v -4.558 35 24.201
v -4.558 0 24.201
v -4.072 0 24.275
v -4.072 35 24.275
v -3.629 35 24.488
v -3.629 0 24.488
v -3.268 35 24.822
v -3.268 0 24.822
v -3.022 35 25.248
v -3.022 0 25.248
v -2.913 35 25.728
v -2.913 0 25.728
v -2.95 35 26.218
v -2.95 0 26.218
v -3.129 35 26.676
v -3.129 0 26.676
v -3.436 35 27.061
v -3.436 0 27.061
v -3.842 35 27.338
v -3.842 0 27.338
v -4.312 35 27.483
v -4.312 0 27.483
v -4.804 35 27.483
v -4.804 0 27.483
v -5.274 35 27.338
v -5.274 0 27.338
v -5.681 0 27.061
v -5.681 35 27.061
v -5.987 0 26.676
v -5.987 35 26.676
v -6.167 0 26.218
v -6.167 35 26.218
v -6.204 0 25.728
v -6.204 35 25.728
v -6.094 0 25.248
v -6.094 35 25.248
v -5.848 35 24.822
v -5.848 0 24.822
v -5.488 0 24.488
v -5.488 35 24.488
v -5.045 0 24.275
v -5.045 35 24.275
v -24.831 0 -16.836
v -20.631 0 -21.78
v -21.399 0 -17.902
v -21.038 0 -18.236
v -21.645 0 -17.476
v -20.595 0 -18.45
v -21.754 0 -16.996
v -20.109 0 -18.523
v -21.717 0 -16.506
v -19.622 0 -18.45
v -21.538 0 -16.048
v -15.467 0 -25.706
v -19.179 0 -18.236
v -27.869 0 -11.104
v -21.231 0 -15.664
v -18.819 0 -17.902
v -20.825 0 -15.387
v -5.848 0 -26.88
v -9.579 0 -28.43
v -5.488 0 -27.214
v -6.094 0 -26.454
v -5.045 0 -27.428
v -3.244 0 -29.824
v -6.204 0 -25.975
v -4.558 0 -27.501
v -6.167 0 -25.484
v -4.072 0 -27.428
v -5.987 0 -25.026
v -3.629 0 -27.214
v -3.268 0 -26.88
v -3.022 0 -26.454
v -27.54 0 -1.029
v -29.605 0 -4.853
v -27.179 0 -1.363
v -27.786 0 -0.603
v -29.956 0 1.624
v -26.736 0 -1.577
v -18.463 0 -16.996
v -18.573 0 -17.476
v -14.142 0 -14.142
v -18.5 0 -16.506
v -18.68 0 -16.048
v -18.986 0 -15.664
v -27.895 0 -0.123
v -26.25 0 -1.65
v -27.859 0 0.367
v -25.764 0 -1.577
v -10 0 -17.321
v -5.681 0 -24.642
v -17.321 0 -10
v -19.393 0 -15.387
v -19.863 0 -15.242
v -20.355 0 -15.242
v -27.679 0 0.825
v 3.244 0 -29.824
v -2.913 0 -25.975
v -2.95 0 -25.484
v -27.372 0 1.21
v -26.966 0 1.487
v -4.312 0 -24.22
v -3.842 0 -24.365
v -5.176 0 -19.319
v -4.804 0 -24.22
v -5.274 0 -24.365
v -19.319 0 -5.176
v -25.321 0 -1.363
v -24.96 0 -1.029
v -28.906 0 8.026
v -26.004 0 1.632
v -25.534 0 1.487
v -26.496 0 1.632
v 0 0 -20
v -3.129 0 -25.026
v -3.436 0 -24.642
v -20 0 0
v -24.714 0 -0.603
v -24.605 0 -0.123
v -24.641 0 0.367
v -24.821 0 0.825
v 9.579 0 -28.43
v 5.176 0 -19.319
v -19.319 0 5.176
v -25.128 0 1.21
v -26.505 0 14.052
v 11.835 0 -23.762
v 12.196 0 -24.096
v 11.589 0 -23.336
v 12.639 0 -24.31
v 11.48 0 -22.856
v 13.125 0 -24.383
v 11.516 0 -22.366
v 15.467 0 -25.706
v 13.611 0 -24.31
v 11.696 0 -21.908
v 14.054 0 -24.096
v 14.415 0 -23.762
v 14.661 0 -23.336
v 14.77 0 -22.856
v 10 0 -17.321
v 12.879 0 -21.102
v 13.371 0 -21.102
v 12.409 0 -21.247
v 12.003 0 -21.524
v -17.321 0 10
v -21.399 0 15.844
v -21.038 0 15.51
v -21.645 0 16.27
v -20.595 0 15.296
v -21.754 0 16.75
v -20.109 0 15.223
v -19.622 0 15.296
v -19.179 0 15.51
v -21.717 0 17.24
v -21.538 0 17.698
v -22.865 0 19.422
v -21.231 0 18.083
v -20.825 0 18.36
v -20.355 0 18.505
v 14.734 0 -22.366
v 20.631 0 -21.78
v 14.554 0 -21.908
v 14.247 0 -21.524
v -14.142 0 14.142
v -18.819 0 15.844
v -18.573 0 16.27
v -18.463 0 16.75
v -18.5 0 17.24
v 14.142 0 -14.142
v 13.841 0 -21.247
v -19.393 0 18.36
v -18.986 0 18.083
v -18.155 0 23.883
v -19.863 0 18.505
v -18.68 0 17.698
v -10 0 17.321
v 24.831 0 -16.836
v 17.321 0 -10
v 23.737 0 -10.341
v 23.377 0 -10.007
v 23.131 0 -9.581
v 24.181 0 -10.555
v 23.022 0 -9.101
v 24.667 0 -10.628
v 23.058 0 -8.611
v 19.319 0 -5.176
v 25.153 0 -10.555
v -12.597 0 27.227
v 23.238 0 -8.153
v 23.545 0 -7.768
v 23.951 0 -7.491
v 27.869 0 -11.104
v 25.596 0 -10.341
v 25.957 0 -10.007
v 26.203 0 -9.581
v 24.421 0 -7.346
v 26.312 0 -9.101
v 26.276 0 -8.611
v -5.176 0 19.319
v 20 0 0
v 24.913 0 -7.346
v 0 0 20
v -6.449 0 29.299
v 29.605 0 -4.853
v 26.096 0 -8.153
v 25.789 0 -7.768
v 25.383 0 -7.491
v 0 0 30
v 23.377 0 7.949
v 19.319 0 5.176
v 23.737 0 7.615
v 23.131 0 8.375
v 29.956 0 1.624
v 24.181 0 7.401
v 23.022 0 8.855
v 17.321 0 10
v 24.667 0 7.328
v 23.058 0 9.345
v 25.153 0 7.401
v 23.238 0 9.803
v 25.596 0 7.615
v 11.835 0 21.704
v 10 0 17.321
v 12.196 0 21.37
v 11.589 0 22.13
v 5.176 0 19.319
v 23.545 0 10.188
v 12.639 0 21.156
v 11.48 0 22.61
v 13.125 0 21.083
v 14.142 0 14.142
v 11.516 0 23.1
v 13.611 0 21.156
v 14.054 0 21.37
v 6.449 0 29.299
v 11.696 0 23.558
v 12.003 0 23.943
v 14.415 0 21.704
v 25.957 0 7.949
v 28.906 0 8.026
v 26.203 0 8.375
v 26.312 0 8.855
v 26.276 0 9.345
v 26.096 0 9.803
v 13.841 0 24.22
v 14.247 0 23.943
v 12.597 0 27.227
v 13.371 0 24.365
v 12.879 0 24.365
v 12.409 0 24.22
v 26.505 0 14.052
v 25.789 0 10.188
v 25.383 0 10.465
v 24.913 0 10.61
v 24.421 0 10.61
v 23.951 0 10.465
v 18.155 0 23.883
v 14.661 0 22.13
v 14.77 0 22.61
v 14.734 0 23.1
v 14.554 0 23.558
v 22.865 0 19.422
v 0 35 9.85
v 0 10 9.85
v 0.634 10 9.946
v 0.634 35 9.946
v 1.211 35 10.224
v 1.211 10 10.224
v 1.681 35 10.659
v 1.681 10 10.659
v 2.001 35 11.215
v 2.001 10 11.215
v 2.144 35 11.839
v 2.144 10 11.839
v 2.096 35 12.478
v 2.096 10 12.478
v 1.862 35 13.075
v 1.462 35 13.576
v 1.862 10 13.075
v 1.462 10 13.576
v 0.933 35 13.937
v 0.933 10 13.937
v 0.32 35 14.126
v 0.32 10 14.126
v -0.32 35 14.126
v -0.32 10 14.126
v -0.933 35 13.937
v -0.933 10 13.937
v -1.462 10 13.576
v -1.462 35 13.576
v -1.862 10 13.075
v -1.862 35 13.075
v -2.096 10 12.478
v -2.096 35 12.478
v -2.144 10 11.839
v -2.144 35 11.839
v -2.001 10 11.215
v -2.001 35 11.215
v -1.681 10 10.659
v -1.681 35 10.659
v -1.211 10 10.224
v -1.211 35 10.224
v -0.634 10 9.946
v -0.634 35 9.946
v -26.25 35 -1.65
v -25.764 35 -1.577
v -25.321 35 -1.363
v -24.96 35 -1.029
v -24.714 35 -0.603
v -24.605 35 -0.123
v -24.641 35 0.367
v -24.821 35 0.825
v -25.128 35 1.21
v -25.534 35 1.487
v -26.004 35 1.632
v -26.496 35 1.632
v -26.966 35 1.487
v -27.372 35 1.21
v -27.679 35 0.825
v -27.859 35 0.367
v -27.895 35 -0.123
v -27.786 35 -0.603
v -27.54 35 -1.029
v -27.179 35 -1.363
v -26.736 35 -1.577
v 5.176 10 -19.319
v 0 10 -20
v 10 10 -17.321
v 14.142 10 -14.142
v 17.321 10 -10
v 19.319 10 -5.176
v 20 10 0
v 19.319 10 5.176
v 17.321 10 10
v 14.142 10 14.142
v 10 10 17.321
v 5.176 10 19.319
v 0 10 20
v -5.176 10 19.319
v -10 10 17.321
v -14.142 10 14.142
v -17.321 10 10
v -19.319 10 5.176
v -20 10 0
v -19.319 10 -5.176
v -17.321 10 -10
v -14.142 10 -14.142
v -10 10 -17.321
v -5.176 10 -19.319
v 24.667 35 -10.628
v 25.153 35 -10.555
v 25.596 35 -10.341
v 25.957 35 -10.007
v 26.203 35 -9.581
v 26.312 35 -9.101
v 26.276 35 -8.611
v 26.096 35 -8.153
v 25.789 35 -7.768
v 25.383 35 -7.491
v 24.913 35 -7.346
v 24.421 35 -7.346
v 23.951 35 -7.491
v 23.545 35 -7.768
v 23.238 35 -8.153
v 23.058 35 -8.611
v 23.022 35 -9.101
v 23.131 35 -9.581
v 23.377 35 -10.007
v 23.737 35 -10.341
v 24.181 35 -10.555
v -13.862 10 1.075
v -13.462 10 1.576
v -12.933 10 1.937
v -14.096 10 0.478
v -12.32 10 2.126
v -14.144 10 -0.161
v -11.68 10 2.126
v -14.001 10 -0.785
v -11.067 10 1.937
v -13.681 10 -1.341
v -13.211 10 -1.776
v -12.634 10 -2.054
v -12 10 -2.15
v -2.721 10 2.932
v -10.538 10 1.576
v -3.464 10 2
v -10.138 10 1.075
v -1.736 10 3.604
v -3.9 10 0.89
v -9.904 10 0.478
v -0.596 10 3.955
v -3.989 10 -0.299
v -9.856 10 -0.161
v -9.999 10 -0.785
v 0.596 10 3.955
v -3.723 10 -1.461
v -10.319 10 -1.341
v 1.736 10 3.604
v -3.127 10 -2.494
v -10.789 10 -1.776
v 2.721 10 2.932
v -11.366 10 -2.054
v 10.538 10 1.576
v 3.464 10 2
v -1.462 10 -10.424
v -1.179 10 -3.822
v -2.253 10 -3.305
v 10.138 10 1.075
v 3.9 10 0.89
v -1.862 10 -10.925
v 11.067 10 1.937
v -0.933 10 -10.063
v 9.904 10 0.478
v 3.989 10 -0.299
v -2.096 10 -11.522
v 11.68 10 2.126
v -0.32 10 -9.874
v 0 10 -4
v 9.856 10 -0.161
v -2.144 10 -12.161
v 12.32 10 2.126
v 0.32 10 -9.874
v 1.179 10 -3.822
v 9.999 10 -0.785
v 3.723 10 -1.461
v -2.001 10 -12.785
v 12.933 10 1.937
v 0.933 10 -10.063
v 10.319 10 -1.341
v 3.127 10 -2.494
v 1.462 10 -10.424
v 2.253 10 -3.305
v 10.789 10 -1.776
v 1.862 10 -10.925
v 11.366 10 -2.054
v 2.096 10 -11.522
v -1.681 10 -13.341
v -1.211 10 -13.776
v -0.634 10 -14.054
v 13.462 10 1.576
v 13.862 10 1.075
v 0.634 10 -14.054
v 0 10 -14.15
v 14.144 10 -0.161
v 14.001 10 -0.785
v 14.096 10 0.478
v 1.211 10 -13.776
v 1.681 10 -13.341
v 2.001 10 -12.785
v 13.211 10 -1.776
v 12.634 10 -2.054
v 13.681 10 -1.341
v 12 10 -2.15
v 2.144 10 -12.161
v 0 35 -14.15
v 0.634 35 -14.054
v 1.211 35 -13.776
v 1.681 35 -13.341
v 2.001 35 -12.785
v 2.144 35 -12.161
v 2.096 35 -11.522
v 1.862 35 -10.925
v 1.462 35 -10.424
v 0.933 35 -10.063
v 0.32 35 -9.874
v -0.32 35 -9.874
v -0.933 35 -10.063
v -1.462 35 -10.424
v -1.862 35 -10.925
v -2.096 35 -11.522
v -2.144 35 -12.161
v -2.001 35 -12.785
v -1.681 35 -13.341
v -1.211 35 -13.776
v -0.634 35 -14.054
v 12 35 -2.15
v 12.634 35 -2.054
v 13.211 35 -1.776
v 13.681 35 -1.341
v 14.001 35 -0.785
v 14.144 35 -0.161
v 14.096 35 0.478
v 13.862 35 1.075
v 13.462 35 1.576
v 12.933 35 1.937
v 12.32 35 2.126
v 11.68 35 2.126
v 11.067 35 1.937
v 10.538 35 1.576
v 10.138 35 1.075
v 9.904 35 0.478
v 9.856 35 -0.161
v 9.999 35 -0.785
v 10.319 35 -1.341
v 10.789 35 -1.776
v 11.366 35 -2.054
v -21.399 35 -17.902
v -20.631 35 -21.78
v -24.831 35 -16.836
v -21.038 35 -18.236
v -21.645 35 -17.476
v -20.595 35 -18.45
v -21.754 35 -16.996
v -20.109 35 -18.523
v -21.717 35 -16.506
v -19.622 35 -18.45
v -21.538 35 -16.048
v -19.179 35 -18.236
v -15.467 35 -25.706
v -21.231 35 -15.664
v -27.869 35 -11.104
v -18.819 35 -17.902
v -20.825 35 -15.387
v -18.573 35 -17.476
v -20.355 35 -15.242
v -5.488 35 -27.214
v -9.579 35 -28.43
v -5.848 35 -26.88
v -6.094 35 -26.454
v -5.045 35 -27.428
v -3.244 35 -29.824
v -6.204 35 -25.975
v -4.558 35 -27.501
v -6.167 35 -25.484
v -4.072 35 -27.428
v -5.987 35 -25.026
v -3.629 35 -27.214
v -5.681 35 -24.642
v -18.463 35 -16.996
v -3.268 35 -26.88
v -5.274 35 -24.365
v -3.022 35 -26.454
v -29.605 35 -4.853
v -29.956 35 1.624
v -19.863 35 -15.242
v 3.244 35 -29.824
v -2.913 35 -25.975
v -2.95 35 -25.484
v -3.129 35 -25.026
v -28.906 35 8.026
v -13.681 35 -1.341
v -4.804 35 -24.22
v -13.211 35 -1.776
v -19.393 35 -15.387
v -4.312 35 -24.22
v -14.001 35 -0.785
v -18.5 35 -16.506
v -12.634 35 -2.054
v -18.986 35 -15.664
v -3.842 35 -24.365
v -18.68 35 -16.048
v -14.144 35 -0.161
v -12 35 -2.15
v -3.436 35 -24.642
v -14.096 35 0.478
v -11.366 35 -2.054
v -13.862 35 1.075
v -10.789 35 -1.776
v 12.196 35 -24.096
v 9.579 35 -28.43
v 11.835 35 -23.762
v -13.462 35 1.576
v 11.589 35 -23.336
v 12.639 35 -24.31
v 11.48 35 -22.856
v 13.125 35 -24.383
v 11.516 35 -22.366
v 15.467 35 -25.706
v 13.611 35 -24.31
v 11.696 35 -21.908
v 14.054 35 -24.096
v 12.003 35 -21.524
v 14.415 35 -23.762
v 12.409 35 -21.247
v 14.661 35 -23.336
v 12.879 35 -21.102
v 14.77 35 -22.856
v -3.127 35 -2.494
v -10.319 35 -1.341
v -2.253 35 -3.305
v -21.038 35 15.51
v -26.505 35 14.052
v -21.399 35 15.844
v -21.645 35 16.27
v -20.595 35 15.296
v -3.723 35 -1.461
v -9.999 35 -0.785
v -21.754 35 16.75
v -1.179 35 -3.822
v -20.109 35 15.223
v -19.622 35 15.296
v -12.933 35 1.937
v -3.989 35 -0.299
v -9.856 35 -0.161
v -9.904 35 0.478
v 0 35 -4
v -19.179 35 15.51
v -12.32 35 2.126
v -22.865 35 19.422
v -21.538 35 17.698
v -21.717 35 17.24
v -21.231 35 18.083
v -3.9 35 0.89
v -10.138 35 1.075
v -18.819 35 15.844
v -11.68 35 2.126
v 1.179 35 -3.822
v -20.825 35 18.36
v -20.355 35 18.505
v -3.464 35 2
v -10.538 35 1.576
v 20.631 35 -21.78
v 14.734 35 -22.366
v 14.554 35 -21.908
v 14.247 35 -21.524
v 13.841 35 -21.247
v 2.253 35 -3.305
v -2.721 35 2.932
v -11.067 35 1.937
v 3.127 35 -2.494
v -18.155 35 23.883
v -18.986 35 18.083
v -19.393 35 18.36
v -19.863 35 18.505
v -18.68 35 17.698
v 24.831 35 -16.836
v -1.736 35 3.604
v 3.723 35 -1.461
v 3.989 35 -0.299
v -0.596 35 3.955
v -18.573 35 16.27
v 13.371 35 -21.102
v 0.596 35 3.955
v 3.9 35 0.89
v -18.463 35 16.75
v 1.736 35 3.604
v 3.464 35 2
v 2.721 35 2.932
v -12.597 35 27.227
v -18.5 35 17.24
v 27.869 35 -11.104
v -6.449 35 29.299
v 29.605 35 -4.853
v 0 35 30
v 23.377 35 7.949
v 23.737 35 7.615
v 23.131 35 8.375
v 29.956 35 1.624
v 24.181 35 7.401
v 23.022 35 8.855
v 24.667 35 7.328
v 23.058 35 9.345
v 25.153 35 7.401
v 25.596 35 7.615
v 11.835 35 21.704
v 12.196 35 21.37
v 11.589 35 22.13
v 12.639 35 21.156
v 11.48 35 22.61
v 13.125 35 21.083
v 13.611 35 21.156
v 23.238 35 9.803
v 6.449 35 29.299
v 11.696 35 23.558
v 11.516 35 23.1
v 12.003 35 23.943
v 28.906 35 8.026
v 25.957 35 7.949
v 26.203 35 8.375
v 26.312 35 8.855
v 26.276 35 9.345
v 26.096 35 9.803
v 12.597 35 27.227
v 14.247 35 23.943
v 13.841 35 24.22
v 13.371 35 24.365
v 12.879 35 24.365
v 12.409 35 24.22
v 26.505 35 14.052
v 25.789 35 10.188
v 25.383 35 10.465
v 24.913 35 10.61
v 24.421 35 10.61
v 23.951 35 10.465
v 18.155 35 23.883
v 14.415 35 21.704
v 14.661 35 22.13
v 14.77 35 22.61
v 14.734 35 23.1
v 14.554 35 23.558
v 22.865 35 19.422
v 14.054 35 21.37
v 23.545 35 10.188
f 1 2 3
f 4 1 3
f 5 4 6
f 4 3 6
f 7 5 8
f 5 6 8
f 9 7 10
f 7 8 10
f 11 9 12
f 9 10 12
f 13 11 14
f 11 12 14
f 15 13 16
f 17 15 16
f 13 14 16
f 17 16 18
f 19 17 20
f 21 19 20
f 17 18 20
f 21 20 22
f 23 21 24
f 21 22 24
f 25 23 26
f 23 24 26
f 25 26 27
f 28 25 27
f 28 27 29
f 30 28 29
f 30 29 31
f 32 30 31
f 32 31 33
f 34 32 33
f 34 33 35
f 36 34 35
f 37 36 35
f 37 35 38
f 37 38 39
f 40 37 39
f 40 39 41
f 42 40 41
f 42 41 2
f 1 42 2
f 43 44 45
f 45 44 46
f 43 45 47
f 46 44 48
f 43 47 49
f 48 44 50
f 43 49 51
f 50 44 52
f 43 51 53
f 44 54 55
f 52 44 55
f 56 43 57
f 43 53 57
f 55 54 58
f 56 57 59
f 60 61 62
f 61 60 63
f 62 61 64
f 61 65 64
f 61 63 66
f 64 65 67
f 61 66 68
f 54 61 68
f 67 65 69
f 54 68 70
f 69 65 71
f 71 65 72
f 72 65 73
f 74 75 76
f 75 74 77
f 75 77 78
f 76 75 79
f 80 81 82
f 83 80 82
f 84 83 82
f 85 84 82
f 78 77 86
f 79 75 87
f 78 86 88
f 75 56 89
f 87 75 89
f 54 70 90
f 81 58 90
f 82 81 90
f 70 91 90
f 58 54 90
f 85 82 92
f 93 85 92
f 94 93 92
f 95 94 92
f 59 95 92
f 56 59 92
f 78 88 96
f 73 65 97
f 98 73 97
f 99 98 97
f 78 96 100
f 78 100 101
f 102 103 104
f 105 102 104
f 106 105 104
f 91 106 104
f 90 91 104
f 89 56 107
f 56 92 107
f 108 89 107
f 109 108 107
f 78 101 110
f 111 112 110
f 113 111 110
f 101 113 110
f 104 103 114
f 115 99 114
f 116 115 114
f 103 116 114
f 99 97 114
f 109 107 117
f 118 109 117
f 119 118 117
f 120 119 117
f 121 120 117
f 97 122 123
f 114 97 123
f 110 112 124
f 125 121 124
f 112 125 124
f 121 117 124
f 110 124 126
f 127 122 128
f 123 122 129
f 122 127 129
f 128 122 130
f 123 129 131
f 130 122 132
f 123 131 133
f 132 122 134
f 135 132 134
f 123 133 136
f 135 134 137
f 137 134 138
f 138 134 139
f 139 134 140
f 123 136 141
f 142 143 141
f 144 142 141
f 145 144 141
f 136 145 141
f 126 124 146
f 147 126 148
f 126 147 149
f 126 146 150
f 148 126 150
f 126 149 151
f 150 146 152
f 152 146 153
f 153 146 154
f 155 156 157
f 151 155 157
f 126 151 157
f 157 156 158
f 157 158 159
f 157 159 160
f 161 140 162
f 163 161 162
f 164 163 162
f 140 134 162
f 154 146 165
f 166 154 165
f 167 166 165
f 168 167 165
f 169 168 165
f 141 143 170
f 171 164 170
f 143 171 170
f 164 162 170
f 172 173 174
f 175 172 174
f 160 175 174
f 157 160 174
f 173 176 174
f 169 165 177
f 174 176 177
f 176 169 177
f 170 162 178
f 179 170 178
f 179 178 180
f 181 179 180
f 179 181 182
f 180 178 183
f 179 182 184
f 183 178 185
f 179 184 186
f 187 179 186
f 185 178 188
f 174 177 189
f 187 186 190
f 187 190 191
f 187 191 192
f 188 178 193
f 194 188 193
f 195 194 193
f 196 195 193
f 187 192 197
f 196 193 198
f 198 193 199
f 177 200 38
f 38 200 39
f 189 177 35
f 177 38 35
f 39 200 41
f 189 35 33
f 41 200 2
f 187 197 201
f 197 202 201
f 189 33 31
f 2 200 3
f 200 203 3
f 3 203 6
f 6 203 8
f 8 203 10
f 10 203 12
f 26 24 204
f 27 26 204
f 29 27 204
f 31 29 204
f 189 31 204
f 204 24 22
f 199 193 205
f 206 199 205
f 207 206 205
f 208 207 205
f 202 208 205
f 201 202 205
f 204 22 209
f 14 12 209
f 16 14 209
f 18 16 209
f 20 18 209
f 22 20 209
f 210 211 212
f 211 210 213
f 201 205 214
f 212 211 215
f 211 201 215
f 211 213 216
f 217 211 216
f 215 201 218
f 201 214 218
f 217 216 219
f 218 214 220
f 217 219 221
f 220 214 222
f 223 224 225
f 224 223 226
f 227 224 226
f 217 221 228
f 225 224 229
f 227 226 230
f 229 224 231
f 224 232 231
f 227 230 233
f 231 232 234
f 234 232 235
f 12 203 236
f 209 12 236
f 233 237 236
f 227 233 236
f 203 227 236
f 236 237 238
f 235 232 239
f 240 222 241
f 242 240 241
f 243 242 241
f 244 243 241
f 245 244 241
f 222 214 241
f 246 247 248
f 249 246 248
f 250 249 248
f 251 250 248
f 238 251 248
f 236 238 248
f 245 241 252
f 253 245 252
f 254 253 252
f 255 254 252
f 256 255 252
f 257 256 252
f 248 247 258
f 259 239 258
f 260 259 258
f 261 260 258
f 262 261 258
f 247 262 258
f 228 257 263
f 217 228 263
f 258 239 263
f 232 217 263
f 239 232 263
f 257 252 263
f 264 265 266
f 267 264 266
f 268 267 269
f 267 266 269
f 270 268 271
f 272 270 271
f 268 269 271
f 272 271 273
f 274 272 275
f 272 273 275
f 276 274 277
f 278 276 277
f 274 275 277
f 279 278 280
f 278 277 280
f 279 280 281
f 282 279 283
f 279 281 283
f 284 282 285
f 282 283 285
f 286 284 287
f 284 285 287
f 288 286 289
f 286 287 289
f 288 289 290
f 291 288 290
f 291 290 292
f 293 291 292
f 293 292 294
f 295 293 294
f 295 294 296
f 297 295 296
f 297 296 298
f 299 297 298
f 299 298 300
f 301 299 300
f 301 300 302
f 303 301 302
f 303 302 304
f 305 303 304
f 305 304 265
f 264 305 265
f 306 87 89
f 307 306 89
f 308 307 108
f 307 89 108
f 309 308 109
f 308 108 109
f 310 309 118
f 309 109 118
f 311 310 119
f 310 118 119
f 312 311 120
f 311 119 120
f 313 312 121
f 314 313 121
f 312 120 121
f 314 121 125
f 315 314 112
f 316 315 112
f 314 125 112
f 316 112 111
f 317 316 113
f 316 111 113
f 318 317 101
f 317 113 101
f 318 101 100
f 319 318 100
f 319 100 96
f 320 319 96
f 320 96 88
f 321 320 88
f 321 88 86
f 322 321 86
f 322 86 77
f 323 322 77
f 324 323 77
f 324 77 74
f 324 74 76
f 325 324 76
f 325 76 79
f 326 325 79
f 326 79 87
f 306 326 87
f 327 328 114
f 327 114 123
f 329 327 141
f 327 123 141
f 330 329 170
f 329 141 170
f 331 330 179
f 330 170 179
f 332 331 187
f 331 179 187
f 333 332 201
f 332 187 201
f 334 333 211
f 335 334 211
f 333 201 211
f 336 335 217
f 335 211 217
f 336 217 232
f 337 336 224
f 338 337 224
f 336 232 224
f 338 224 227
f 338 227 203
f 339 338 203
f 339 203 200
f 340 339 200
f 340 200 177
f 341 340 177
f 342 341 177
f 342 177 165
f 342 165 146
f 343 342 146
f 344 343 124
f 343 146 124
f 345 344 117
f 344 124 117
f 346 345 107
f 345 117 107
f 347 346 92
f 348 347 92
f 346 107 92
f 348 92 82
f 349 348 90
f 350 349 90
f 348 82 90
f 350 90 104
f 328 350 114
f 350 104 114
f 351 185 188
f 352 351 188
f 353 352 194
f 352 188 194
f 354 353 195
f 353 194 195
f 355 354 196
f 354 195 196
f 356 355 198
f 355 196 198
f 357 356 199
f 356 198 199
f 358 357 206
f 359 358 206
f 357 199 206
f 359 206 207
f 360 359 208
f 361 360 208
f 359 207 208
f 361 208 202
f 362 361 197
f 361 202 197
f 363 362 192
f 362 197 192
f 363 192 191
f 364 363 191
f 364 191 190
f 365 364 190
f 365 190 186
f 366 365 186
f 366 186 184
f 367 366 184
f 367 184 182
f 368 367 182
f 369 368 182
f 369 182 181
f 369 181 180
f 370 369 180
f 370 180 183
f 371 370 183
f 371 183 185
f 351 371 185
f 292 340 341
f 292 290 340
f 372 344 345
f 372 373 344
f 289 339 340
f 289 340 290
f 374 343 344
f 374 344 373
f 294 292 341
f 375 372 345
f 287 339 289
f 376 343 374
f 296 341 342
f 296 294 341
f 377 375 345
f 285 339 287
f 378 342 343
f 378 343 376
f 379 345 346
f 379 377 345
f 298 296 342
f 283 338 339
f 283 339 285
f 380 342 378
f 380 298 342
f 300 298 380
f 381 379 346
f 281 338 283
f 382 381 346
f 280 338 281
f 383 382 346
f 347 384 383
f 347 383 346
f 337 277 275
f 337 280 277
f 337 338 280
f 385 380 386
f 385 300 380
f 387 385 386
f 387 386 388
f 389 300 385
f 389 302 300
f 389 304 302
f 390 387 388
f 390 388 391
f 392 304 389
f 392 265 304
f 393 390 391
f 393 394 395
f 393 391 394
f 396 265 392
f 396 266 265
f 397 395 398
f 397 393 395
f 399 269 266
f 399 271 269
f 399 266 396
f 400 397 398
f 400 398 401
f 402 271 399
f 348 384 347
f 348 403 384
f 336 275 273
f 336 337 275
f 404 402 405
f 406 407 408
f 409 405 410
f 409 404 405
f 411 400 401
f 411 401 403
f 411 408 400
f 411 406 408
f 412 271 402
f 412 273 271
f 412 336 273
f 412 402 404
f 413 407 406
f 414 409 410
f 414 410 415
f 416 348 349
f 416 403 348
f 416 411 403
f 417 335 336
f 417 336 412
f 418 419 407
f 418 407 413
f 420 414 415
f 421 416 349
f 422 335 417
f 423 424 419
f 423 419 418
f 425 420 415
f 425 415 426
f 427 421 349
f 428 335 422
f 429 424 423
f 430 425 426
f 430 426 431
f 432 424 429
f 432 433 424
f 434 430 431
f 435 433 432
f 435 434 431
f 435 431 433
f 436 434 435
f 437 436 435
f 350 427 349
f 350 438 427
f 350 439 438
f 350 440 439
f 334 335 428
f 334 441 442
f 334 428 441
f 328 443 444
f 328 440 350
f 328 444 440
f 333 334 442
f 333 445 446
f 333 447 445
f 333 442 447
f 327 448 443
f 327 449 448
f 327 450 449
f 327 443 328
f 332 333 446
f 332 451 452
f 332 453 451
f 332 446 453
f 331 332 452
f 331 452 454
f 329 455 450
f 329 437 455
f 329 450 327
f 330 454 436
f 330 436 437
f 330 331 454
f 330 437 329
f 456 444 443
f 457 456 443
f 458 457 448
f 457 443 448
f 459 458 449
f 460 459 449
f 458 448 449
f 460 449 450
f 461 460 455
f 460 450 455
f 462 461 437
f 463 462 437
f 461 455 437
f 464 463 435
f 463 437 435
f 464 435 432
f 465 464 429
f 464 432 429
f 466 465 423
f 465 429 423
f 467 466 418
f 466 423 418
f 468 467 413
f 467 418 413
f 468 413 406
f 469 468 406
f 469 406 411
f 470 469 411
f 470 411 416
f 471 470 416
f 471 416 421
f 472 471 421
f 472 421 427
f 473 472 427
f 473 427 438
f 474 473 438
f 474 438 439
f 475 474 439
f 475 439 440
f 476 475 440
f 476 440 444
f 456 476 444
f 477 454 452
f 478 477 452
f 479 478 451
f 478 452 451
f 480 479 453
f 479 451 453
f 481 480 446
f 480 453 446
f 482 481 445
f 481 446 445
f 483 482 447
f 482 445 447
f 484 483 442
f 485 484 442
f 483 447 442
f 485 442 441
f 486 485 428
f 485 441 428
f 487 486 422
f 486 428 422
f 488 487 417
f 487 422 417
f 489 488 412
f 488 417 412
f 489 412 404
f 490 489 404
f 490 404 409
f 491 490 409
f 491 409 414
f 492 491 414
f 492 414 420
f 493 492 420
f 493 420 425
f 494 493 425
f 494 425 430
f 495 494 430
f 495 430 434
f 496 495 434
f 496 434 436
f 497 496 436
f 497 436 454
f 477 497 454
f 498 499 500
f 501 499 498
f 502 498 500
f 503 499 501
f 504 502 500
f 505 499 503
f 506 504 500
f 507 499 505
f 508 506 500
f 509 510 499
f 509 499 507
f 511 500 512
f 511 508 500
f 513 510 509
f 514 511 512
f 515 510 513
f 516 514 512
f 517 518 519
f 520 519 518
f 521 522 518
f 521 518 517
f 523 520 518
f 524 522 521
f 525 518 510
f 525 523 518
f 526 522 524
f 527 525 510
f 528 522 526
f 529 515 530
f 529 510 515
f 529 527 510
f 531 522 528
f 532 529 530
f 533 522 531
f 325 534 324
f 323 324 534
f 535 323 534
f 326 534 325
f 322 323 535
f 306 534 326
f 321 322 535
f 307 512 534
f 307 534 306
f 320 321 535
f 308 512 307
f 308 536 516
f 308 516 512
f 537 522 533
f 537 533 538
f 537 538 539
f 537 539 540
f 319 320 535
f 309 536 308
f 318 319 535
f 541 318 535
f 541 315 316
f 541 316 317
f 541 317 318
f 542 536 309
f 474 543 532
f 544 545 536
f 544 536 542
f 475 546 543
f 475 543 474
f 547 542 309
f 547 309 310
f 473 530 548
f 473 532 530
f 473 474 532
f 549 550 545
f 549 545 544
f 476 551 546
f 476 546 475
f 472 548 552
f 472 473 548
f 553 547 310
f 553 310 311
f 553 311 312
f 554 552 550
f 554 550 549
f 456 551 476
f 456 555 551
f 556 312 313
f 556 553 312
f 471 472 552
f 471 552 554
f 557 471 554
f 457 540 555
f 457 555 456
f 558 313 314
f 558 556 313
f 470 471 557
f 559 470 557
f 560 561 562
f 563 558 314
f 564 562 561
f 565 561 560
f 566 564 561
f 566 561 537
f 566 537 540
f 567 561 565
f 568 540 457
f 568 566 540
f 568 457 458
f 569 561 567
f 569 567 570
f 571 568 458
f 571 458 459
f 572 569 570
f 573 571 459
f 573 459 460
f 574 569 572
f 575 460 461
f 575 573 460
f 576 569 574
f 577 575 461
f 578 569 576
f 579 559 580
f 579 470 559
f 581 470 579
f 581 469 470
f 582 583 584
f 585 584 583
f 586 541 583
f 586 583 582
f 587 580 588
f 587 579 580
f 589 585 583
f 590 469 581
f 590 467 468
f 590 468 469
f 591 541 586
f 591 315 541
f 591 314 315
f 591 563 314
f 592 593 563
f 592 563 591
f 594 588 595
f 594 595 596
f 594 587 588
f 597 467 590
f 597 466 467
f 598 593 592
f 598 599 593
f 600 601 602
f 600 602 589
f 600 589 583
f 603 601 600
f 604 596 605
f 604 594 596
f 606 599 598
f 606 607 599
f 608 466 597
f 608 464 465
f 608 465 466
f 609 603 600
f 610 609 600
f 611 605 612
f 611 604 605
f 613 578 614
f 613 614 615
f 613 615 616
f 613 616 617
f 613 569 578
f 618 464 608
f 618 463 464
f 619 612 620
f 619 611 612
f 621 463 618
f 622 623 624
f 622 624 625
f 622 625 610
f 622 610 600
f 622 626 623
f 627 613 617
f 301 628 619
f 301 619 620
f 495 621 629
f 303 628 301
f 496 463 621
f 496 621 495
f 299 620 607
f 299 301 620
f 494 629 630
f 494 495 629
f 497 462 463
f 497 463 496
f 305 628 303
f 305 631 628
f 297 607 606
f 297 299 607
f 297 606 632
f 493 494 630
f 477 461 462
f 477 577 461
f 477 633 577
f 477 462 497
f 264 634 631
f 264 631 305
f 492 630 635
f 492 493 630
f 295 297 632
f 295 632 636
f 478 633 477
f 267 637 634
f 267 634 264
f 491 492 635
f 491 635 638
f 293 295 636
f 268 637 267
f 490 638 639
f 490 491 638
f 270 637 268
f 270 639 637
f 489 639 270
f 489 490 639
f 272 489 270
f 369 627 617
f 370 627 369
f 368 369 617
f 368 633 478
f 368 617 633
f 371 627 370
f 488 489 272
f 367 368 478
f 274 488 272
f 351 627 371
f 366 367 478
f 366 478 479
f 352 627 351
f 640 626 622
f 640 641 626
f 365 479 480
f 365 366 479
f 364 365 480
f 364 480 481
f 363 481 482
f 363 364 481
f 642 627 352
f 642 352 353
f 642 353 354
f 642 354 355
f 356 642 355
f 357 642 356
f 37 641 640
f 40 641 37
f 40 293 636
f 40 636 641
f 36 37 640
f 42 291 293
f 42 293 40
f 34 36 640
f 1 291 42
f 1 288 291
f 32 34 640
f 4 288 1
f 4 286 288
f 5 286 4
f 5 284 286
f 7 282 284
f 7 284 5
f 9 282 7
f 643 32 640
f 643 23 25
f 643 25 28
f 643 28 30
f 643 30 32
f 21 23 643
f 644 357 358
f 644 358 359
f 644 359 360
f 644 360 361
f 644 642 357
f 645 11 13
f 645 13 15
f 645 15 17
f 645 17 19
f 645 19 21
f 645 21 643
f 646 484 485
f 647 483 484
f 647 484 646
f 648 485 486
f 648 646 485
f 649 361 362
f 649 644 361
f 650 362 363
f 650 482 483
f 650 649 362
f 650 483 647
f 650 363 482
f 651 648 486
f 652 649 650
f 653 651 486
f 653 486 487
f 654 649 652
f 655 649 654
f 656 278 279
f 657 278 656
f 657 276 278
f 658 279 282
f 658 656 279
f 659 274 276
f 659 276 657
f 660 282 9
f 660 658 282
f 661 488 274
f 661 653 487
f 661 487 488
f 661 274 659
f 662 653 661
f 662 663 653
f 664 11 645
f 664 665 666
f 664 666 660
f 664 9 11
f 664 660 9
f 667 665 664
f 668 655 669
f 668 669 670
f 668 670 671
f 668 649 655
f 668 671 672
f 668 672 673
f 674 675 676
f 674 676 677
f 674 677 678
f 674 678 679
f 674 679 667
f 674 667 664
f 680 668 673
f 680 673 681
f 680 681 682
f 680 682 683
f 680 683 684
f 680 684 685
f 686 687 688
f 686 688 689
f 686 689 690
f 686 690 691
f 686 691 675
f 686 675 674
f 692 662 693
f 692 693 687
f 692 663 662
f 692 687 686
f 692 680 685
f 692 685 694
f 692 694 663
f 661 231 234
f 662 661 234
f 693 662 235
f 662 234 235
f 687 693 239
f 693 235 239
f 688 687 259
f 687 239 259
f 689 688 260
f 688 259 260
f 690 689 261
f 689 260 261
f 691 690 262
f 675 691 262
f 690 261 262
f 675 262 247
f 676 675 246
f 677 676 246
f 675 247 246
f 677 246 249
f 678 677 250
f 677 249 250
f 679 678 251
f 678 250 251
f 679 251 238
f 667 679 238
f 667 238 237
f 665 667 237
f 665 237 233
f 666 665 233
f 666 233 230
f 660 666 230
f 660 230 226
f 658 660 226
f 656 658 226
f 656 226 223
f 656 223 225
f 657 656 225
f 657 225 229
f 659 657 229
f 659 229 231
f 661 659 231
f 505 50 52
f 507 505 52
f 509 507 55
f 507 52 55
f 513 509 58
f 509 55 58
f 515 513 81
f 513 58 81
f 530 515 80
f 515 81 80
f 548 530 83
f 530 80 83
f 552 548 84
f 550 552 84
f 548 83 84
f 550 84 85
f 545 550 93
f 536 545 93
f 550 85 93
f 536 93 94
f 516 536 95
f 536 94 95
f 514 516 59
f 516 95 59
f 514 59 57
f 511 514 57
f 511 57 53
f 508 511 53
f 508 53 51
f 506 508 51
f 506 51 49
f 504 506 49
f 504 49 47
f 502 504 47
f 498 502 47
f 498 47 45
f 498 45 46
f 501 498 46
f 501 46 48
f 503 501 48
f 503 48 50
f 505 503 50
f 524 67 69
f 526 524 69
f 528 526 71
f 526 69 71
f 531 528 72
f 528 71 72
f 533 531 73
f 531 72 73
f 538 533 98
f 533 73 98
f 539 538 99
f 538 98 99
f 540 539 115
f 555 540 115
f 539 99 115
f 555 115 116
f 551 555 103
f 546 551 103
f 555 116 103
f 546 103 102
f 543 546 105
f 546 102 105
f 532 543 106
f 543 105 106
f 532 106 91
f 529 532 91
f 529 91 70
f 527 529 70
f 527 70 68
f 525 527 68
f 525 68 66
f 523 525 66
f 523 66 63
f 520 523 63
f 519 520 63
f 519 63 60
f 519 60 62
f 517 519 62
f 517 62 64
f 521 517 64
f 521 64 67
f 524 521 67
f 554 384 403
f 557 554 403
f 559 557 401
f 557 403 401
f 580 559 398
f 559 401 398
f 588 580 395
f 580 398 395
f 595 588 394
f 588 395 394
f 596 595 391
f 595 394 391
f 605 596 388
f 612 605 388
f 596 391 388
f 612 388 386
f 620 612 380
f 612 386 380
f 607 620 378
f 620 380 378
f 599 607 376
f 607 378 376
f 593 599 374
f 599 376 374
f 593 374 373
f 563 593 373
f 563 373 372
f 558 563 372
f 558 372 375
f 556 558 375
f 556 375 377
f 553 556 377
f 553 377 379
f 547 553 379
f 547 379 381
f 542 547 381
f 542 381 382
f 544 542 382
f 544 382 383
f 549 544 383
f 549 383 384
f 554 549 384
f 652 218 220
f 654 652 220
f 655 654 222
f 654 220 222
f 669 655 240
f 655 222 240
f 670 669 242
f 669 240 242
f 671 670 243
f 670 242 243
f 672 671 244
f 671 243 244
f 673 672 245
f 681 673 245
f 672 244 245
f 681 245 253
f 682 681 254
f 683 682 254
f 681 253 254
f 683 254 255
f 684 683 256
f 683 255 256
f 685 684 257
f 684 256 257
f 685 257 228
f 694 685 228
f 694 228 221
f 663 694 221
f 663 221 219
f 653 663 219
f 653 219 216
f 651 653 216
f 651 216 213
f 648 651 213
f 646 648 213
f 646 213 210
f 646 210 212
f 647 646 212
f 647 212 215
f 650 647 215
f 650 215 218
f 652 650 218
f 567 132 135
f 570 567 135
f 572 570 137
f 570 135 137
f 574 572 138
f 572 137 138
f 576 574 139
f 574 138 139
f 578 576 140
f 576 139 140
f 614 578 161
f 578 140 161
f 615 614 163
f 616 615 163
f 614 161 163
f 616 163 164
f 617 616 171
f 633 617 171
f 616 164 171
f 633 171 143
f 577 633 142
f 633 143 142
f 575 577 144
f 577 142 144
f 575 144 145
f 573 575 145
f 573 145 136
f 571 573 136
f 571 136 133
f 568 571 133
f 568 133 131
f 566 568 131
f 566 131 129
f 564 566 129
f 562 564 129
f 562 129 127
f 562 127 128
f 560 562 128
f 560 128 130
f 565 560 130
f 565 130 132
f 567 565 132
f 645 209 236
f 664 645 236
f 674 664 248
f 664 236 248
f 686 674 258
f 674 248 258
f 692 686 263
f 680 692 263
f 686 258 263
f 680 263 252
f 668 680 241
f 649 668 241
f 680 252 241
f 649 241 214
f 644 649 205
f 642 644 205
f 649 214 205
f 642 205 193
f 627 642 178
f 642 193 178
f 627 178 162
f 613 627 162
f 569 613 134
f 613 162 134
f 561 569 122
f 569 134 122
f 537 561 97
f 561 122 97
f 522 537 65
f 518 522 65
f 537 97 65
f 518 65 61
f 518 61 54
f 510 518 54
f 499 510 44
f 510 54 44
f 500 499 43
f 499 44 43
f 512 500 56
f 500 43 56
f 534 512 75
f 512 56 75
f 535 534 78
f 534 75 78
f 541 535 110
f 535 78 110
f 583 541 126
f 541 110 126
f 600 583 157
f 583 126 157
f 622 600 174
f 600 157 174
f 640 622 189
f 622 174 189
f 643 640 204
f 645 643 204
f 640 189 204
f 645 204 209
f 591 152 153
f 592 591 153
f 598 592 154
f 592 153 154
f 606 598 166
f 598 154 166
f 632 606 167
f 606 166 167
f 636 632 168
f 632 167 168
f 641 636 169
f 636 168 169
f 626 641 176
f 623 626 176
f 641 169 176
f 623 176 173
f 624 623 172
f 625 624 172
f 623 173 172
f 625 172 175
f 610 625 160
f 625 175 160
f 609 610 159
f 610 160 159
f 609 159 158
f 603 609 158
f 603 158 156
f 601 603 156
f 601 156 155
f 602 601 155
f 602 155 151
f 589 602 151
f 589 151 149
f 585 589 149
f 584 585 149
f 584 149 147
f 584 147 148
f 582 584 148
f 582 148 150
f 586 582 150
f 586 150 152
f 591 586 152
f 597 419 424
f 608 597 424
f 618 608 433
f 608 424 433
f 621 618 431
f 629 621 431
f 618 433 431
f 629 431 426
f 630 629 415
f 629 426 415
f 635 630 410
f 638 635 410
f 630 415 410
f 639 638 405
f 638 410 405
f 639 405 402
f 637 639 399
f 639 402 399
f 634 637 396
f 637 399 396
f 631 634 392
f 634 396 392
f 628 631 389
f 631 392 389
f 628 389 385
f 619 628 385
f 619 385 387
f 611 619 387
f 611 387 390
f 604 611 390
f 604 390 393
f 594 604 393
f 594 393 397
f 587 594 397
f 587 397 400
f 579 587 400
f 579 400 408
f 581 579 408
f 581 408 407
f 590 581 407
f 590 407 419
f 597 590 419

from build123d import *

# Parameters (mm, degrees)
SKETCH_1_R          = 30
EXTRUDE_1_DEPTH     = 35
SKETCH_2_R          = 1.65
CUT_EXTRUDE_1_DEPTH = 56
SKETCH_4_R          = 20
CUT_EXTRUDE_3_DEPTH = 10
SKETCH_5_R          = 4
CUT_EXTRUDE_4_DEPTH = 50.244289009
SKETCH_6_R          = 2.15
CUT_EXTRUDE_5_DEPTH = 50.244289009


with BuildPart() as part:
    # 草图1 → 凸台-拉伸1 (new body)
    with BuildSketch(Plane(origin=(0, 0, 0), x_dir=(1, 0, 0), z_dir=(0, 1, 0))):
        with Locations(Location((0, 0, 0), (0, 0, 270))):
            Circle(SKETCH_1_R)
    extrude(amount=EXTRUDE_1_DEPTH)

    # 草图2 → 切除-拉伸1 (cut, through all)
    with BuildSketch(Plane.XZ):
        with Locations(Location((-26.25, 0, 0), (0, 0, 270))):
            Circle(SKETCH_2_R)
        with Locations(Location((-20.108666632, 16.873174754, 0), (0, 0, 270))):
            Circle(SKETCH_2_R)
        with Locations(Location((-4.558264664, 25.851203517, 0), (0, 0, 270))):
            Circle(SKETCH_2_R)
        with Locations(Location((13.125, 22.733166849, 0), (0, 0, 270))):
            Circle(SKETCH_2_R)
        with Locations(Location((24.666931296, 8.978028762, 0), (0, 0, 270))):
            Circle(SKETCH_2_R)
        with Locations(Location((24.666931296, -8.978028762, 0), (0, 0, 270))):
            Circle(SKETCH_2_R)
        with Locations(Location((13.125, -22.733166849, 0), (0, 0, 270))):
            Circle(SKETCH_2_R)
        with Locations(Location((-4.558264664, -25.851203517, 0), (0, 0, 270))):
            Circle(SKETCH_2_R)
        with Locations(Location((-20.108666632, -16.873174754, 0), (0, 0, 270))):
            Circle(SKETCH_2_R)
    extrude(amount=-CUT_EXTRUDE_1_DEPTH, mode=Mode.SUBTRACT)

    # 草图4 → 切除-拉伸3 (cut)
    with BuildSketch(Plane.XZ):
        with Locations(Location((0, 0, 0), (0, 0, 270))):
            Circle(SKETCH_4_R)
    extrude(amount=-CUT_EXTRUDE_3_DEPTH, mode=Mode.SUBTRACT)

    # 草图5 → 切除-拉伸4 (cut, through all)
    with BuildSketch(Plane.XZ.offset(-10)):
        with Locations(Location((0, 0, 0), (0, 0, 270))):
            Circle(SKETCH_5_R)
    extrude(amount=-CUT_EXTRUDE_4_DEPTH, mode=Mode.SUBTRACT)

    # 草图6 → 切除-拉伸5 (cut, through all)
    with BuildSketch(Plane.XZ.offset(-10)):
        with Locations(Location((0, 12, 0), (0, 0, 270))):
            Circle(SKETCH_6_R)
        with Locations(Location((12, 0, 0), (0, 0, 270))):
            Circle(SKETCH_6_R)
        with Locations(Location((0, -12, 0), (0, 0, 270))):
            Circle(SKETCH_6_R)
        with Locations(Location((-12, 0, 0), (0, 0, 270))):
            Circle(SKETCH_6_R)
    extrude(amount=-CUT_EXTRUDE_5_DEPTH, mode=Mode.SUBTRACT)


solid = part.part
